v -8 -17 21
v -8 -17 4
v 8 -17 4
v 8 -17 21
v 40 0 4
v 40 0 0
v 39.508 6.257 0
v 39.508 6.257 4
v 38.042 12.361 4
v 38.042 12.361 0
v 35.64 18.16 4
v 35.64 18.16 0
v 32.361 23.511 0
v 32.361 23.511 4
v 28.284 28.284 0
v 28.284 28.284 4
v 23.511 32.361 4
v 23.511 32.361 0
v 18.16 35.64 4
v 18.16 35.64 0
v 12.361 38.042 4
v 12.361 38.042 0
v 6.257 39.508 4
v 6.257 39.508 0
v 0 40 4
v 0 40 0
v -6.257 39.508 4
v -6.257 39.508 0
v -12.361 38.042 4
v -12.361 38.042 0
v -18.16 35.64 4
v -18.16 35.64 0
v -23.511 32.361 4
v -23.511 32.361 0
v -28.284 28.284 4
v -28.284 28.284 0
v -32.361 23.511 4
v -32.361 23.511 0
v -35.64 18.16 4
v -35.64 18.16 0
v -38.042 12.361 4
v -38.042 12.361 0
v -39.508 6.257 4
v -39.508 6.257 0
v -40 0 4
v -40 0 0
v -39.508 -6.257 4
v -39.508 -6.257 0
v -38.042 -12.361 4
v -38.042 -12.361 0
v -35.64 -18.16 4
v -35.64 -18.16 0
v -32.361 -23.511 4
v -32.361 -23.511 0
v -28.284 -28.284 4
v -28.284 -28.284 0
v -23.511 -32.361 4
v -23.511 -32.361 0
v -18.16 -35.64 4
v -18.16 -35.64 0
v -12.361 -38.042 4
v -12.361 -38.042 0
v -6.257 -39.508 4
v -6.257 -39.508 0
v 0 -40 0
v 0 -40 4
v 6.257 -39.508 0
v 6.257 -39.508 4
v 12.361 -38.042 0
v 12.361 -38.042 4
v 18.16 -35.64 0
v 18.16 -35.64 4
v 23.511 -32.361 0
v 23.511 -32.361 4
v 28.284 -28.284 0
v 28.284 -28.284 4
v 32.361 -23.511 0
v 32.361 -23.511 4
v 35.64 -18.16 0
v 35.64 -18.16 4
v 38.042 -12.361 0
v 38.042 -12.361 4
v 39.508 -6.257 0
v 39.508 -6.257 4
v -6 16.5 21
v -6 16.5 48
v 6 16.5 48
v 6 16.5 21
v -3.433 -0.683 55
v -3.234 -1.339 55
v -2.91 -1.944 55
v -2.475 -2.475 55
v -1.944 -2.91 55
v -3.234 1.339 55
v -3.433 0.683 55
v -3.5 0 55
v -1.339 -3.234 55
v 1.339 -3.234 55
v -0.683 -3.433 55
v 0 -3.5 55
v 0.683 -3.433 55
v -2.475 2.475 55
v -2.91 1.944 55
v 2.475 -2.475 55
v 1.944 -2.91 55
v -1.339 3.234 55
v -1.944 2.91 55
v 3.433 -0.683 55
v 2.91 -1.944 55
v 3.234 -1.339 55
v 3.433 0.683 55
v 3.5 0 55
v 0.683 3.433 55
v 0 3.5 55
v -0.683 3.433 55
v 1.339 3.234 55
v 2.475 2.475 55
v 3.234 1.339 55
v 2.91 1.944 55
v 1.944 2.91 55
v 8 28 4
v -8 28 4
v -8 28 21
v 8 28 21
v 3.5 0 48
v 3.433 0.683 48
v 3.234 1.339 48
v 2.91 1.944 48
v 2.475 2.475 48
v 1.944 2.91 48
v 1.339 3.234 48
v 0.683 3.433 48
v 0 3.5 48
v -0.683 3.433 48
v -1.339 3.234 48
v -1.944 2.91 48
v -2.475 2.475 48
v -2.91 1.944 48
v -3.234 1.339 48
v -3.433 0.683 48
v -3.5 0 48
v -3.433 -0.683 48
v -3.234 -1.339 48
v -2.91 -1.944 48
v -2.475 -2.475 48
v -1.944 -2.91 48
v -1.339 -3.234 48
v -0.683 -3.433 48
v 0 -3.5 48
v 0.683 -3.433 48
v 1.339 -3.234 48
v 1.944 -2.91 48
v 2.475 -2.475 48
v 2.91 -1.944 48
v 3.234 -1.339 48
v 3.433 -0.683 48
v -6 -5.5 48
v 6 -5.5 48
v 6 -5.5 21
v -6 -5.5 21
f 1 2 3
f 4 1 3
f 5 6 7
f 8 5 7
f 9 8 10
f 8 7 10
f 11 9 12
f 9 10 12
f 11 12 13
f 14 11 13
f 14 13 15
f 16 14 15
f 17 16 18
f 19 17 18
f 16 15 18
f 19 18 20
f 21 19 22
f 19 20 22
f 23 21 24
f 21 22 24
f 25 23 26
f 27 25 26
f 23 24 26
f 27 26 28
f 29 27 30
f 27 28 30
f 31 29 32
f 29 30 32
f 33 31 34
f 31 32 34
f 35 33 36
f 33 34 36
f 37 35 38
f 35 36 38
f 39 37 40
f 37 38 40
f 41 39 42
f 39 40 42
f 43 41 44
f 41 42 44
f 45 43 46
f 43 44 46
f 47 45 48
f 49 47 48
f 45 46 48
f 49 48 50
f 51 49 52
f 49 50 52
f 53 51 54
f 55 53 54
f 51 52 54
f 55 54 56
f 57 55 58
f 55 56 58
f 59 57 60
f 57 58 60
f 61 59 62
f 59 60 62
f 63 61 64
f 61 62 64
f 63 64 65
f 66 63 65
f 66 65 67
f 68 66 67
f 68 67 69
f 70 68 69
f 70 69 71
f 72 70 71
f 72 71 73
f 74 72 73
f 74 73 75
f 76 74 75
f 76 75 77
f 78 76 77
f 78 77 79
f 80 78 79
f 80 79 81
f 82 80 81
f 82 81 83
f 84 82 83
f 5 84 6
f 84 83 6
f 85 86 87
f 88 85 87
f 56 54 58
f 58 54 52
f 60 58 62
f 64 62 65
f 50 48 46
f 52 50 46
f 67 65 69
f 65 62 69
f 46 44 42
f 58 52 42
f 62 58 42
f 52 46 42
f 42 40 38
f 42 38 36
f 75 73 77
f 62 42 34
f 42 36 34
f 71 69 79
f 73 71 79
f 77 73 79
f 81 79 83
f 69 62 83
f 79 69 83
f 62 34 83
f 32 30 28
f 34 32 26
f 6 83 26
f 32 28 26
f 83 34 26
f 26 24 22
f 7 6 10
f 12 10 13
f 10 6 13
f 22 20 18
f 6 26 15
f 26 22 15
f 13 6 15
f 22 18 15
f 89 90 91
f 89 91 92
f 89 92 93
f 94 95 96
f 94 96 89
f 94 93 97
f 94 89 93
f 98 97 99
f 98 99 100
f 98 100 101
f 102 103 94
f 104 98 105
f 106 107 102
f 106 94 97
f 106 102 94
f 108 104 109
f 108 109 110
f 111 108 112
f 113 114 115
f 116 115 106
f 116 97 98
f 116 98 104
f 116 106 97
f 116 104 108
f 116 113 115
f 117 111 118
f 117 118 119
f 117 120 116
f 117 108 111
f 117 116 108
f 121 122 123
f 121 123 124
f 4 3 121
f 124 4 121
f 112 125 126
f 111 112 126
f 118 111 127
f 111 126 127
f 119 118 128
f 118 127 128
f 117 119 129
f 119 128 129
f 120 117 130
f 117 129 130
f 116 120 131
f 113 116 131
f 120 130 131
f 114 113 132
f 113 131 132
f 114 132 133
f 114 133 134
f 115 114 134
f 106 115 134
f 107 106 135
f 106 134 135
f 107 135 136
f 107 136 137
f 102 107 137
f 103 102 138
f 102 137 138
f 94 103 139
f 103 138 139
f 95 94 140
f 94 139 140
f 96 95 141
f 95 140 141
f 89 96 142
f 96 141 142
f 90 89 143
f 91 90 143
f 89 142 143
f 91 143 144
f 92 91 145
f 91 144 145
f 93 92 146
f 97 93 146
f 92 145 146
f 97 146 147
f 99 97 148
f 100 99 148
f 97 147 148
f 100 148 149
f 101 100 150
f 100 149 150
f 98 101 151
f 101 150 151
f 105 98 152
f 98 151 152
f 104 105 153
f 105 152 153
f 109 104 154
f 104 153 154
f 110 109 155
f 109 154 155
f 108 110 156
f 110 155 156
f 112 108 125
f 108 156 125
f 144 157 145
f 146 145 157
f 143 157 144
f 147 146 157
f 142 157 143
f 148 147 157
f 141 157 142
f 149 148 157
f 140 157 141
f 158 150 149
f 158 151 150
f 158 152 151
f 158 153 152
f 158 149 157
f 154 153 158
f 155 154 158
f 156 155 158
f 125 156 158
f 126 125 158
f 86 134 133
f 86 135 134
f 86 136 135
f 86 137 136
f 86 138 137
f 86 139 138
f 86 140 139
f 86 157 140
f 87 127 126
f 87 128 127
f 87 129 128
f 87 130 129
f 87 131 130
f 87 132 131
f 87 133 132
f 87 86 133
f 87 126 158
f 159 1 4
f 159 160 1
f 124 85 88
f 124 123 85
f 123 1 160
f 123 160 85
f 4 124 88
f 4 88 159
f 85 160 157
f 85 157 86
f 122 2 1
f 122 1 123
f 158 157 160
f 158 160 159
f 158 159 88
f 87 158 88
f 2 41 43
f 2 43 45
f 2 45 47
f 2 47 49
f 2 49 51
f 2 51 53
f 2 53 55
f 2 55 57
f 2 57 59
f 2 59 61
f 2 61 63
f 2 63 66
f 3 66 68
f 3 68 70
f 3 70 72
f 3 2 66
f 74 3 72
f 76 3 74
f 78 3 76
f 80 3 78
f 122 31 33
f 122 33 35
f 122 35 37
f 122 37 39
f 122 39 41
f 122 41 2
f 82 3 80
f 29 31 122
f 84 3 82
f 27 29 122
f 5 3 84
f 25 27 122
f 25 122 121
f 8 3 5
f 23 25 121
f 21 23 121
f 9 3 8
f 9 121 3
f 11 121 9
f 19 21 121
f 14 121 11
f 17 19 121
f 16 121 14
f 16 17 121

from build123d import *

# Parameters (mm, degrees)
SKIZZE1_R                       = 40
AUFSATZ_LINEAR_AUSTRAGEN1_DEPTH = 4
SKIZZE2_W                       = 16
SKIZZE2_H                       = 45
AUFSATZ_LINEAR_AUSTRAGEN2_DEPTH = 17
SKIZZE3_W                       = 12
SKIZZE3_H                       = 22
AUFSATZ_LINEAR_AUSTRAGEN3_DEPTH = 27
SKIZZE4_R                       = 3.5
AUFSATZ_LINEAR_AUSTRAGEN4_DEPTH = 7


with BuildPart() as part:
    # Skizze1 → Aufsatz-Linear austragen1 (new body)
    with BuildSketch(Plane.XY):
        Circle(SKIZZE1_R)
    extrude(amount=AUFSATZ_LINEAR_AUSTRAGEN1_DEPTH)

    # Skizze2 → Aufsatz-Linear austragen2 (add)
    with BuildSketch(Plane.XY.offset(4)):
        with Locations((0, 5.5)):
            Rectangle(SKIZZE2_W, SKIZZE2_H)
    extrude(amount=AUFSATZ_LINEAR_AUSTRAGEN2_DEPTH)

    # Skizze3 → Aufsatz-Linear austragen3 (add)
    with BuildSketch(Plane.XY.offset(21)):
        with Locations((0, 5.5)):
            Rectangle(SKIZZE3_W, SKIZZE3_H)
    extrude(amount=AUFSATZ_LINEAR_AUSTRAGEN3_DEPTH)

    # Skizze4 → Aufsatz-Linear austragen4 (add)
    with BuildSketch(Plane.XY.offset(48)):
        Circle(SKIZZE4_R)
    extrude(amount=AUFSATZ_LINEAR_AUSTRAGEN4_DEPTH)


solid = part.part
